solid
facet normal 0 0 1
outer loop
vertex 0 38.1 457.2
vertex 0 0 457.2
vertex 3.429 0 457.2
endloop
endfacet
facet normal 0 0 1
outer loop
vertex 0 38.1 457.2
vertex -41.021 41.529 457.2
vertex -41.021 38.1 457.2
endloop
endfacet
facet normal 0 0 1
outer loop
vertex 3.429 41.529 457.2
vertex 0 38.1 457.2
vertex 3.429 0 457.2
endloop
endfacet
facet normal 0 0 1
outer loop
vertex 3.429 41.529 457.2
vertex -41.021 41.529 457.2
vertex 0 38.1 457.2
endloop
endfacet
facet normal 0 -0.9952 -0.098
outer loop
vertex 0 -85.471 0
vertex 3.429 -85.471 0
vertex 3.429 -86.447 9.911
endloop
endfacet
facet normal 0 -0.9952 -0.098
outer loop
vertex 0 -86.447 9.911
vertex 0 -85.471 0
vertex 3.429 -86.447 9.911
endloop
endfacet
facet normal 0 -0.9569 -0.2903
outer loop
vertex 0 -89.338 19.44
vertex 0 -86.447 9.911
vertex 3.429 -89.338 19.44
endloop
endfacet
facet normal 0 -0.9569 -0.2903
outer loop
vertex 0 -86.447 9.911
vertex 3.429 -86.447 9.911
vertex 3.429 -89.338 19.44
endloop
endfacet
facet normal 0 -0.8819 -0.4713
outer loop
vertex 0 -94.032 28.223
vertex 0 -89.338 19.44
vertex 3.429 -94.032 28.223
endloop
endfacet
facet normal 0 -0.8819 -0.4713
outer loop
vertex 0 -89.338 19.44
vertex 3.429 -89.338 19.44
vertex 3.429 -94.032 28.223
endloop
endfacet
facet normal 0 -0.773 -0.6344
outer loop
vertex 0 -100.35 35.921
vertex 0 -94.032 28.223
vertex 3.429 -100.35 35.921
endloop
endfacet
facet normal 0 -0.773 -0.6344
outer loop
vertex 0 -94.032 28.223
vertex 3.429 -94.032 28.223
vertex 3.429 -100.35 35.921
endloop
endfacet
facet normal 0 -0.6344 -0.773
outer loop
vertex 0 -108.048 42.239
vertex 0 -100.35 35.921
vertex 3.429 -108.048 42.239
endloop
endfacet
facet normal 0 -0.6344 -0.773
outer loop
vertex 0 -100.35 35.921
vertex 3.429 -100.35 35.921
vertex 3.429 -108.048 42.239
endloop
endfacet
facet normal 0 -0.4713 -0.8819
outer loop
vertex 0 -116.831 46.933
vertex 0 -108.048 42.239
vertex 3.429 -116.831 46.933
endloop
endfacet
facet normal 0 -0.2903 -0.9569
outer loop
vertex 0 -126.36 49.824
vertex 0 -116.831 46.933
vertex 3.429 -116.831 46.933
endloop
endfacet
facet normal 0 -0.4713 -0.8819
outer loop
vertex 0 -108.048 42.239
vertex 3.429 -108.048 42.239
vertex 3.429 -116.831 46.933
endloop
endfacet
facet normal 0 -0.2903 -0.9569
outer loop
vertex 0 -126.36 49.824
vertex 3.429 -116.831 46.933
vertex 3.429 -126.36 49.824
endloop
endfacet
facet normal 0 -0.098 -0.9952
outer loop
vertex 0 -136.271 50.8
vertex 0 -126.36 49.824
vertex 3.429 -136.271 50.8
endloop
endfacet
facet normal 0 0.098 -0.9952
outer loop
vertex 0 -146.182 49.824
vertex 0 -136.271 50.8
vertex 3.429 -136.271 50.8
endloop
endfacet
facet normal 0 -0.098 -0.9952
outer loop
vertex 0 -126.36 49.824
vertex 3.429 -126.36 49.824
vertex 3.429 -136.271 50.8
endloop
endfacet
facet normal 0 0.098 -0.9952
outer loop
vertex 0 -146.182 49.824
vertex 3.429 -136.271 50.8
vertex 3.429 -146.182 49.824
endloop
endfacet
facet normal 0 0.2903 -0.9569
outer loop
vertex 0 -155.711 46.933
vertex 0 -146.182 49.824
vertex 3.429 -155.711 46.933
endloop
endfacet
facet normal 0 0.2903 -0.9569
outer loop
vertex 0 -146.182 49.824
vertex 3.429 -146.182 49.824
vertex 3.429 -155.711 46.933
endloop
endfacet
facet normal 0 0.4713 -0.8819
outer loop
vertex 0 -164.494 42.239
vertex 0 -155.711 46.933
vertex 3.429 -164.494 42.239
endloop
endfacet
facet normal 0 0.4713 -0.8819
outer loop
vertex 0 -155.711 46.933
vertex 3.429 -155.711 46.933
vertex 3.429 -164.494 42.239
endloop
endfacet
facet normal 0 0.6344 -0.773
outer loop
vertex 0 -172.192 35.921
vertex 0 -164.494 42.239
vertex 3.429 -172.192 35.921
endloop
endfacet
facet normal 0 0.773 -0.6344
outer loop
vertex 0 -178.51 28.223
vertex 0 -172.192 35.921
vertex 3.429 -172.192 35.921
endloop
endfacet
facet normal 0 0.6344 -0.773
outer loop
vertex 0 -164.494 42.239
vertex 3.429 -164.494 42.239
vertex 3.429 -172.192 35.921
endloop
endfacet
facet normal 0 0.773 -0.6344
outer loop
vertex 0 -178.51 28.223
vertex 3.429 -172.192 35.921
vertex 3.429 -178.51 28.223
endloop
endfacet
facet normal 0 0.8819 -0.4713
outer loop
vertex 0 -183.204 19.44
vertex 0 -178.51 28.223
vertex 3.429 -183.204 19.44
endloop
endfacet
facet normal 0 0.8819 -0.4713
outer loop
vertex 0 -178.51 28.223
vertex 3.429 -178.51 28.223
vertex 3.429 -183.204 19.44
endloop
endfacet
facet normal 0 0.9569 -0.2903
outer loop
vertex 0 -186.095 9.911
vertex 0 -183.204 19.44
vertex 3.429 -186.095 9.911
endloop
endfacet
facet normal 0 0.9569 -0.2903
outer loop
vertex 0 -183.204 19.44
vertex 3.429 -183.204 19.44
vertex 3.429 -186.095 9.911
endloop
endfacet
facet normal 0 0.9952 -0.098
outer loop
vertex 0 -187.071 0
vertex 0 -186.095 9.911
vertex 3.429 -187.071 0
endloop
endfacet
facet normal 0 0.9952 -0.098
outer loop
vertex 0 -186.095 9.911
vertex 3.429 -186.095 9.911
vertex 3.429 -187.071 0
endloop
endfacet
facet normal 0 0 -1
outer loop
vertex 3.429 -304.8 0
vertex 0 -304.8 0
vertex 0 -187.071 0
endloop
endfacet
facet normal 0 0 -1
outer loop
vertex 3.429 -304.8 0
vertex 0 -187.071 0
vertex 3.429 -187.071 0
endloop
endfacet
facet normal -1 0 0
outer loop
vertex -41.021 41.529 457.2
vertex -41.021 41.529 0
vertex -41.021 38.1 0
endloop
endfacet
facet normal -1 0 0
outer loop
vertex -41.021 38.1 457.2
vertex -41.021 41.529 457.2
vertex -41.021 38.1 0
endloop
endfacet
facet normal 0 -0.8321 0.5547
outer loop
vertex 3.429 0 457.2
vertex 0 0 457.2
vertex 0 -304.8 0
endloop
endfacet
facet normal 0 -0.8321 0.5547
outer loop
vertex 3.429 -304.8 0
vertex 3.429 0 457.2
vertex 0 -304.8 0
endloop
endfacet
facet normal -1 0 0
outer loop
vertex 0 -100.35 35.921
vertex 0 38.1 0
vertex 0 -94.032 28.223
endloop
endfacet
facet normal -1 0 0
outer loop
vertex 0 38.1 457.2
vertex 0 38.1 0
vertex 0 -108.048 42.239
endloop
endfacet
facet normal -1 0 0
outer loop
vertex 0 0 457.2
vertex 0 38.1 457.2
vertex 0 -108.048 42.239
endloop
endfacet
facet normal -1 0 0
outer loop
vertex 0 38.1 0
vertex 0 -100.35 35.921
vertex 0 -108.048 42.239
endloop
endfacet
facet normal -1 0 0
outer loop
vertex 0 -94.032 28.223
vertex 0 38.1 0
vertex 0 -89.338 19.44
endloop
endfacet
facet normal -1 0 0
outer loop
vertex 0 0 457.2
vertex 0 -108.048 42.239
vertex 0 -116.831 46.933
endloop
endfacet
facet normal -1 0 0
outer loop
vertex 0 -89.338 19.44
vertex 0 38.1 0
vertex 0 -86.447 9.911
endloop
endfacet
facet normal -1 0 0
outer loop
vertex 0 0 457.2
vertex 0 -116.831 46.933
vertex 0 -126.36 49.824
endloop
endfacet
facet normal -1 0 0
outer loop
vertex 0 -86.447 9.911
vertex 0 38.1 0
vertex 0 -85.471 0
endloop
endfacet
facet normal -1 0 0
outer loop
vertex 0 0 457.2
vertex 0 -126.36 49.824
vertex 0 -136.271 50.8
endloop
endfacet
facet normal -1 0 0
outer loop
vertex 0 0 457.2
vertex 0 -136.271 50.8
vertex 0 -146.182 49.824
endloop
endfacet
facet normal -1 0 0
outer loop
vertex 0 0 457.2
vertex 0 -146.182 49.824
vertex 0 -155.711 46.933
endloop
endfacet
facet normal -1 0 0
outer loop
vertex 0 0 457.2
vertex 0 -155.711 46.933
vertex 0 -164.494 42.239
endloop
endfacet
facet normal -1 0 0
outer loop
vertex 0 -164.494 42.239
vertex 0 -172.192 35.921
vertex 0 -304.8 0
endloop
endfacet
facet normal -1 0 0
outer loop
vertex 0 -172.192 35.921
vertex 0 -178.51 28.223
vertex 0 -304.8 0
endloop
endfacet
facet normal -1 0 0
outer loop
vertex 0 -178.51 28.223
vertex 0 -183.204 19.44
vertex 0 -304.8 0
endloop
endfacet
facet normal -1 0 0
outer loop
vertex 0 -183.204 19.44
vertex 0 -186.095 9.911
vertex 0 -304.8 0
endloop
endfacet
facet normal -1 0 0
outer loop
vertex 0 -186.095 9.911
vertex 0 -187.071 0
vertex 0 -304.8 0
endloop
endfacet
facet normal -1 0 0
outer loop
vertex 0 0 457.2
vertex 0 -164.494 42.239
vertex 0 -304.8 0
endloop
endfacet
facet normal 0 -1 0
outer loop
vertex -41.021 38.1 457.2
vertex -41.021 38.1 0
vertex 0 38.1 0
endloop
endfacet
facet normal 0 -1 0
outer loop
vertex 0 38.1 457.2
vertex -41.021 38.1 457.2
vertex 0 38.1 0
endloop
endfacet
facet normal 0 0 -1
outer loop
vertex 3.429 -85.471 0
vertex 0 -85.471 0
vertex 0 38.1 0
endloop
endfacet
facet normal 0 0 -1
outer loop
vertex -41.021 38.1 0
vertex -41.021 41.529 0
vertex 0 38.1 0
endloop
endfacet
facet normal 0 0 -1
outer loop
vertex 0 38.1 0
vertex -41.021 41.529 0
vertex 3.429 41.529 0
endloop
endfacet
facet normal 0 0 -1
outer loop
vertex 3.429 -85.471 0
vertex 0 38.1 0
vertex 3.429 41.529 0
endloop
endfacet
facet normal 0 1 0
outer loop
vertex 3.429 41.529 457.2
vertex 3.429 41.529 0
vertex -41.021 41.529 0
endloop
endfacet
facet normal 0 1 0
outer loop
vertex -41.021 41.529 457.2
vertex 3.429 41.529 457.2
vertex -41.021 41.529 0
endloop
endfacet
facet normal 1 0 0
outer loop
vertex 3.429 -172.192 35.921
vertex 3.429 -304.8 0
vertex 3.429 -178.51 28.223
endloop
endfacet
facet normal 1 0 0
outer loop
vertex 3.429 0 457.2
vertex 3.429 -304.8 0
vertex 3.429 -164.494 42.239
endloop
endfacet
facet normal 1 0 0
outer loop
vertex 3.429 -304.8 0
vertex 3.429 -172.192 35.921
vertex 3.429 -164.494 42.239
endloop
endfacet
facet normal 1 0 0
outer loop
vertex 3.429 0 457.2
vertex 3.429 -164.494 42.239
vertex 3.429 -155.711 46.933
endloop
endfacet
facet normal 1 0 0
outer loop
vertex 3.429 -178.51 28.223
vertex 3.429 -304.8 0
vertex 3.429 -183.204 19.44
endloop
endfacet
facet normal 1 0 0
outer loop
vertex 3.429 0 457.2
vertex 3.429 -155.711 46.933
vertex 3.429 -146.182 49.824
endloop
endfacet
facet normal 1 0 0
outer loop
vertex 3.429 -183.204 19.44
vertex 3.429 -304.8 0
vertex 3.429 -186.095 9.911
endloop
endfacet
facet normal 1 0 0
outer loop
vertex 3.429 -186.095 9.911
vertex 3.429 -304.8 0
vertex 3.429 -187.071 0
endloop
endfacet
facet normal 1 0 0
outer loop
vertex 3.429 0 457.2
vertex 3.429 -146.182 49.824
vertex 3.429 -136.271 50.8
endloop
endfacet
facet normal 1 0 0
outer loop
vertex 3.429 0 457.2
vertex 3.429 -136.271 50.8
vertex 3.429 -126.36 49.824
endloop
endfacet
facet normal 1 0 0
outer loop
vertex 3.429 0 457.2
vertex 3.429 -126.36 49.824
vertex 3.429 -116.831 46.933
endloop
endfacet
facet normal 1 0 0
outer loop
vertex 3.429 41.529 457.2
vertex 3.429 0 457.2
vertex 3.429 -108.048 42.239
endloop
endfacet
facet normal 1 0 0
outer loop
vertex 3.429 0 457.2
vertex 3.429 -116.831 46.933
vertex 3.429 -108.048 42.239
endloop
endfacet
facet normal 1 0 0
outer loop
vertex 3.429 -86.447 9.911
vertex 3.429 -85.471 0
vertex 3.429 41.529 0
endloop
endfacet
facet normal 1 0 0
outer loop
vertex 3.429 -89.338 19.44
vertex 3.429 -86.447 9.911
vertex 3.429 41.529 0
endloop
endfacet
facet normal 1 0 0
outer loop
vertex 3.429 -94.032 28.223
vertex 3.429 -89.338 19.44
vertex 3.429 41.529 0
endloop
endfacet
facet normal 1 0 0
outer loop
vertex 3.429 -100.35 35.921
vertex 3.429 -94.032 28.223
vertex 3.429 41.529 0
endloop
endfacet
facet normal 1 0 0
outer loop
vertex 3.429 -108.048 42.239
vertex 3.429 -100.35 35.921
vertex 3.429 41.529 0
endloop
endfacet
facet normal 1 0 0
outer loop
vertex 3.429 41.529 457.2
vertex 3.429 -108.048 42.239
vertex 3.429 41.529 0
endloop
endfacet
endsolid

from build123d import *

# Parameters (mm, degrees)
F1_DEPTH = 3.429
F3_DEPTH = 457.2
F4_R     = 50.8
F5_DEPTH = 25.4


with BuildPart() as f1:
    # F0 (on Right) → F1 (new body)
    with BuildSketch(Plane.YZ):
        Polygon((-304.8, 0), (0, 0), (0, 457.2), align=None)
    extrude(amount=F1_DEPTH)

    # F2 (on Top) → F3 (join, through all)
    with BuildSketch(Plane.XY):
        Polygon((0, 38.1), (0, 0), (3.429, 0), (3.429, 41.529), (-41.021, 41.529), (-41.021, 38.1), align=None)
    extrude(amount=F3_DEPTH)

    # F4 (on face) → F5 (cut)
    with BuildSketch(Plane.YZ.offset(3.429)):
        with Locations((-136.271, 0)):
            Circle(F4_R)
    extrude(amount=-F5_DEPTH, mode=Mode.SUBTRACT)


solid = f1.part
